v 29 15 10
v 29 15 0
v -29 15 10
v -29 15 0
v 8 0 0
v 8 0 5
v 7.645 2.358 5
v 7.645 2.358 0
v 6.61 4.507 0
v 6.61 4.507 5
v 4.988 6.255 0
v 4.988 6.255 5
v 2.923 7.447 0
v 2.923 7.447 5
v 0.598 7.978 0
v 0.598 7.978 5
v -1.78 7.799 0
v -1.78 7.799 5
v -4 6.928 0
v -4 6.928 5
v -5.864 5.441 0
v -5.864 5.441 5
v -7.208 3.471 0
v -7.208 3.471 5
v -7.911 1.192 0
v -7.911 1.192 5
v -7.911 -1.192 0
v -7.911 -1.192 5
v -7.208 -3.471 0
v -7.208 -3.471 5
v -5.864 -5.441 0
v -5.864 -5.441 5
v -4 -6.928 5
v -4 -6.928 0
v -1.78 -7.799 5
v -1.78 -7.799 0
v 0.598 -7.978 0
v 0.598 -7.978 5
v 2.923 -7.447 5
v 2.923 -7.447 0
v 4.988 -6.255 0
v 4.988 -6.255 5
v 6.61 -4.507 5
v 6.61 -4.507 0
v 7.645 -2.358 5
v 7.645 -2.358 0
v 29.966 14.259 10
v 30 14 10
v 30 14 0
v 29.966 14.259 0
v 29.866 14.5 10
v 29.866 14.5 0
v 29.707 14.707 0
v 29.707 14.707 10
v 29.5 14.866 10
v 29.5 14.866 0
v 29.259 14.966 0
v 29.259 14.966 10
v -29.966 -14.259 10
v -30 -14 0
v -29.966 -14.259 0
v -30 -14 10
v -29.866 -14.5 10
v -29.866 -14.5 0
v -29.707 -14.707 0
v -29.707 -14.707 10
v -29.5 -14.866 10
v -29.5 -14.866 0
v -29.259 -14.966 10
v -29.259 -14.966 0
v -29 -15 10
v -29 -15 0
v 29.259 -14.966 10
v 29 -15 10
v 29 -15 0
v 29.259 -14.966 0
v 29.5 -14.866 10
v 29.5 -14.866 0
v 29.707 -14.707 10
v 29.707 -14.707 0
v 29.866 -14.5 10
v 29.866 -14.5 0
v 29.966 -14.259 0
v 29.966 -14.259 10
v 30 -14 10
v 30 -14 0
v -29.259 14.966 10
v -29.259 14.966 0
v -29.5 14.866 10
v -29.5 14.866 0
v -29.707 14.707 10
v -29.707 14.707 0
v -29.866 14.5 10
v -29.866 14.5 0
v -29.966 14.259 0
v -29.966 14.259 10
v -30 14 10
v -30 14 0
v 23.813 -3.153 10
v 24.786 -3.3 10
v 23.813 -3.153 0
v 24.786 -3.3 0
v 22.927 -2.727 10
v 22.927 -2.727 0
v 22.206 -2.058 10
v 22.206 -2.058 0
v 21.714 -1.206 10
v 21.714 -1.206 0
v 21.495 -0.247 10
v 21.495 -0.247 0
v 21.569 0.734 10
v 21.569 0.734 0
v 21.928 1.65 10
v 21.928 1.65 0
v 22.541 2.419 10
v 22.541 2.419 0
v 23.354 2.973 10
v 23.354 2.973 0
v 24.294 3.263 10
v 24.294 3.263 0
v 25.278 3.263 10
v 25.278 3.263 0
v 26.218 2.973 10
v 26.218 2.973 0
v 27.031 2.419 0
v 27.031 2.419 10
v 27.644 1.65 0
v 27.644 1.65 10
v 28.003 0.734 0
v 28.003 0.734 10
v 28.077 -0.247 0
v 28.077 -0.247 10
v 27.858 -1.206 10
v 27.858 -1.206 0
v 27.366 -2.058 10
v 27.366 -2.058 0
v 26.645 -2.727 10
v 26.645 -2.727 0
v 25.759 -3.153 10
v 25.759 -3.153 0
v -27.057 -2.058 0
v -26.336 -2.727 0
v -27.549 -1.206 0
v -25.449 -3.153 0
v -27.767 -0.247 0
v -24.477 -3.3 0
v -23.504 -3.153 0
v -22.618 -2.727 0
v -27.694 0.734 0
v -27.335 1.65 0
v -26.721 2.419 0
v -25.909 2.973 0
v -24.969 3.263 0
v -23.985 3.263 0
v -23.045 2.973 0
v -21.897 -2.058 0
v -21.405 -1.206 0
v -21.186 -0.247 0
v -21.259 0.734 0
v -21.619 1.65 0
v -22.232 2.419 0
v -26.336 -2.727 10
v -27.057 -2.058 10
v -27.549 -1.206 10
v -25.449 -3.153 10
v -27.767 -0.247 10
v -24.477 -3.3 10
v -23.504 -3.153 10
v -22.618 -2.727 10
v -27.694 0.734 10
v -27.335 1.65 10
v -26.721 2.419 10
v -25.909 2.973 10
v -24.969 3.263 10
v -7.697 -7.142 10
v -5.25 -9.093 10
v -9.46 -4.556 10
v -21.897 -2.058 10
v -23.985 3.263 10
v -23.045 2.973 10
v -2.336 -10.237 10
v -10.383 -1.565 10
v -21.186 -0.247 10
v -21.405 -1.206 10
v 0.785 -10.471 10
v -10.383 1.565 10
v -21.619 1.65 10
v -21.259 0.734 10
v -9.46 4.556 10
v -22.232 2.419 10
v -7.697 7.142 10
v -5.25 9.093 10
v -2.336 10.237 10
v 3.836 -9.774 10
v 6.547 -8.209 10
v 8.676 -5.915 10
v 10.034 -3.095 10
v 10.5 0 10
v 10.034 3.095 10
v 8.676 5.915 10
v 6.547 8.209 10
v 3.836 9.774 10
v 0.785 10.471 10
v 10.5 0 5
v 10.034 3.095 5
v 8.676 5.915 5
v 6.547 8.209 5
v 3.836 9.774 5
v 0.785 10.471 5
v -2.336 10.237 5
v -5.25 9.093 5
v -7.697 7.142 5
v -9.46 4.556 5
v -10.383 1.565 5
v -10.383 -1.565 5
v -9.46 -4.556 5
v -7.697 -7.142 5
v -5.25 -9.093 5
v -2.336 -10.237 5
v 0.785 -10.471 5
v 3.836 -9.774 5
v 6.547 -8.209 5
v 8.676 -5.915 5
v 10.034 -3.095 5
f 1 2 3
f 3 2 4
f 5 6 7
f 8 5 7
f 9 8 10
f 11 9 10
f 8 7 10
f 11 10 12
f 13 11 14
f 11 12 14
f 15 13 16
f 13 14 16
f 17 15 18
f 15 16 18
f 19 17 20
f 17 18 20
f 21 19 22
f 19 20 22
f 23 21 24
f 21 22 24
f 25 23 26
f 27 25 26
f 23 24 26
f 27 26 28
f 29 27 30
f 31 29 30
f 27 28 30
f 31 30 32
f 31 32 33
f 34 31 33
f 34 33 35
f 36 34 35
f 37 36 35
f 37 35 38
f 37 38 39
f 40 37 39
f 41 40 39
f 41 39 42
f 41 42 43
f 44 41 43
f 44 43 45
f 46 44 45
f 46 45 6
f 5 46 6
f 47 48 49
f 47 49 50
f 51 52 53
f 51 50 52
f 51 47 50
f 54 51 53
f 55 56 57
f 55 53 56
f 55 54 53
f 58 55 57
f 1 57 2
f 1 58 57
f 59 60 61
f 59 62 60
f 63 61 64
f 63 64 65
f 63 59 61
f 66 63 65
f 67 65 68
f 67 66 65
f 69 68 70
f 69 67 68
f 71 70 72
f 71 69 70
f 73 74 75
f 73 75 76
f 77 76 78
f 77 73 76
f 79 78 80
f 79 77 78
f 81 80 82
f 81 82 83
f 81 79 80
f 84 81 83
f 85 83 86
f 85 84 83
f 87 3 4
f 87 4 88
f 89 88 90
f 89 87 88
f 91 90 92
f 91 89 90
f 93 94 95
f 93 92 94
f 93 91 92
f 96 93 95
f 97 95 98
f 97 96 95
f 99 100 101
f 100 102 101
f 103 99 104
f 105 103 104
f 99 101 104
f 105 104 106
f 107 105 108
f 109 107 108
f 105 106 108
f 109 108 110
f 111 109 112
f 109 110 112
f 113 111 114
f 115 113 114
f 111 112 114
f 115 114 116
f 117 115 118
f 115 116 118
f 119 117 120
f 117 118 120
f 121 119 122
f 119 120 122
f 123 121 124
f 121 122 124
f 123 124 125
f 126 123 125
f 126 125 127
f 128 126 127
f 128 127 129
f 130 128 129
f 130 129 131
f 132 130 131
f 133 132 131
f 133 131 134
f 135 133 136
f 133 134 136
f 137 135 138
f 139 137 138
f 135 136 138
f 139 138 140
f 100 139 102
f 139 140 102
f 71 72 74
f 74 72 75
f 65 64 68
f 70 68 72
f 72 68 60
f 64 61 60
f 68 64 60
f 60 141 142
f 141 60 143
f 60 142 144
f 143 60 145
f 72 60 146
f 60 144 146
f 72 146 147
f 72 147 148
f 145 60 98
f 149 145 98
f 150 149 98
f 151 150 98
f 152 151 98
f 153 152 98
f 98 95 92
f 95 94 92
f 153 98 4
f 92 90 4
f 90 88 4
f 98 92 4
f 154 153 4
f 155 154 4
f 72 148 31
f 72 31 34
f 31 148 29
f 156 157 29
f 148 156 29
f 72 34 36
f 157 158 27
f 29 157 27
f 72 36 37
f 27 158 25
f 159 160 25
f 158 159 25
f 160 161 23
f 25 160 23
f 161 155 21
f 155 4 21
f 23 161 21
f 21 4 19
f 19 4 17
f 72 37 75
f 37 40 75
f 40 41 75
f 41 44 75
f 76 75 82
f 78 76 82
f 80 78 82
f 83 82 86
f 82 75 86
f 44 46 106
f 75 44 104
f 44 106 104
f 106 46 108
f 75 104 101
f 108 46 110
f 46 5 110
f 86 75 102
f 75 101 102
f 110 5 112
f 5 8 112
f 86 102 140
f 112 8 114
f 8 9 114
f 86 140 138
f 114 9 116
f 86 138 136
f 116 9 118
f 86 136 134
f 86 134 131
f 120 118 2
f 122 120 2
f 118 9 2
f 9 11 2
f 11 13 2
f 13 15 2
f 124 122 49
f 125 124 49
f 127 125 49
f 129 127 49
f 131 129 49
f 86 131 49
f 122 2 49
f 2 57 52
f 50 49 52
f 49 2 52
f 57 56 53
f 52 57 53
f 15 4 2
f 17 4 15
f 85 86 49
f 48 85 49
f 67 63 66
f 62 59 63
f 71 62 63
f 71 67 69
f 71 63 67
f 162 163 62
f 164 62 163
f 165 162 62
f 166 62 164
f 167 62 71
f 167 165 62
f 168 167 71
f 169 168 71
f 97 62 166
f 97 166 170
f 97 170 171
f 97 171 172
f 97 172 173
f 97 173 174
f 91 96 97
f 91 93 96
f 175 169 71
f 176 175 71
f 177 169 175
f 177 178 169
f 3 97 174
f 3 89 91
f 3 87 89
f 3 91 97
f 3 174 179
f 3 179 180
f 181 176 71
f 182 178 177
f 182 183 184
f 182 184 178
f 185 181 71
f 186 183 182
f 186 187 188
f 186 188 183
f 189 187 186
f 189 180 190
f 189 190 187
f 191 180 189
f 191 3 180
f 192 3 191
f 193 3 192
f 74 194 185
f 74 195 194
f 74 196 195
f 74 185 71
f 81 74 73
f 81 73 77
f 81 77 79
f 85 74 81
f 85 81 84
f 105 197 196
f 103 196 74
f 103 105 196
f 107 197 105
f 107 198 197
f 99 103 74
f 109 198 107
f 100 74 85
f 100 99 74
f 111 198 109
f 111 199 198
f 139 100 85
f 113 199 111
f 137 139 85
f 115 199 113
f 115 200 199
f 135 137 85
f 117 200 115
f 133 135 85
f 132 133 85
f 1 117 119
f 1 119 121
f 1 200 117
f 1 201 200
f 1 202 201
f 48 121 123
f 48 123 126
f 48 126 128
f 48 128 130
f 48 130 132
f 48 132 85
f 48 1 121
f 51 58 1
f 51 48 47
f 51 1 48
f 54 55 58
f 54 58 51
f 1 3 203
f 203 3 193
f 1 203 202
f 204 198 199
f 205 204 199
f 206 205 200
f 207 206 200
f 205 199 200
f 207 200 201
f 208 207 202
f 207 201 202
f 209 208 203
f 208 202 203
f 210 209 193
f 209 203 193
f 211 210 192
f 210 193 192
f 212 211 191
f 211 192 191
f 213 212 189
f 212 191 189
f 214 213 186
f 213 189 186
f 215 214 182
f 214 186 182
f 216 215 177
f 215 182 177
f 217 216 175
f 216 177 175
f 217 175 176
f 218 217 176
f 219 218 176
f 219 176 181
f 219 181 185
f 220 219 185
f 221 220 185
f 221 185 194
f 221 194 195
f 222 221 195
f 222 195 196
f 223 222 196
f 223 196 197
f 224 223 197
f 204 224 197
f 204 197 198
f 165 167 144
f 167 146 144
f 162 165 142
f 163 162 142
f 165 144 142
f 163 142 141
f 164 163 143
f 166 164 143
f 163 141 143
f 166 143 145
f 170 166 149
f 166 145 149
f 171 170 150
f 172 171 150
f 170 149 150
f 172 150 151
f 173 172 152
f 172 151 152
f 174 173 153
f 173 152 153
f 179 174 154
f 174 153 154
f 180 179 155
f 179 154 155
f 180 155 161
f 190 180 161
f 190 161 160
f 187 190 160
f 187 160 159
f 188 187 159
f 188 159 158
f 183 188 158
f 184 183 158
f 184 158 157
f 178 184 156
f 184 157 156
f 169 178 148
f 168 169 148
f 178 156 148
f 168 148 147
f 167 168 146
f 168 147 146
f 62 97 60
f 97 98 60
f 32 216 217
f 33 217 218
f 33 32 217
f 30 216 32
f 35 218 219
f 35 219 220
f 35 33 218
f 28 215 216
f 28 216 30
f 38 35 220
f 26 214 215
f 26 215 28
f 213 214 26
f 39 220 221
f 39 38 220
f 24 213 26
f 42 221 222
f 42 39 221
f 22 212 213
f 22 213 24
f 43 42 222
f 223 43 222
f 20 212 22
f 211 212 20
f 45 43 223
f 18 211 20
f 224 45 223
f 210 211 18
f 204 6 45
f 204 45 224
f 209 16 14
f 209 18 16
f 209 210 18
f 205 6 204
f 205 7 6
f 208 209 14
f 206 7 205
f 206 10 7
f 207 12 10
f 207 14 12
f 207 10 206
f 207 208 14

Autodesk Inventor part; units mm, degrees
ref_plane "YZ Plane" through (0, 0, 0) normal (1, 0, 0) x (0, 1, 0)
ref_plane "XZ Plane" through (0, 0, 0) normal (0, 1, 0) x (-1, 0, 0)
ref_plane "XY Plane" through (0, 0, 0) normal (0, 0, 1) x (1, 0, 0)
sketch "Sketch1" plane through (0, 0, 0) normal (0, 0, 1) x (1, 0, 0)
  line L0 (-30, -15) -> (30, -15)
  line L1 (30, -15) -> (30, 15)
  line L2 (30, 15) -> (-30, 15)
  line L3 (-30, 15) -> (-30, -15)
  line L4 (-30, -15) -> (30, 15) construction
  line L5 (30, -15) -> (-30, 15) construction
  point P0 (0, 0)
  dimension "d0" = 60
  dimension "d1" = 30
extrude "Extrusion1" add sketch "Sketch1" along normal blind 10
sketch "Sketch2" plane through (0, 0, 10) normal (0, 0, 1) x (1, 0, 0)
  circle A0 centre (0, 0) radius 10.5
  dimension "d4" = 21
extrude "Extrusion2" cut sketch "Sketch2" against normal blind 5
sketch "Sketch3" plane through (0, 0, 5) normal (0, 0, 1) x (1, 0, 0)
  circle A0 centre (0, 0) radius 8
  dimension "d7" = 16
extrude "Extrusion3" cut sketch "Sketch3" against normal blind 5
sketch "Sketch4" plane through (0, 0, 10) normal (0, 0, 1) x (1, 0, 0)
  point P0 (0, 0)
  point P1 (-24.4767, 0)
  point P2 (24.786, 0)
hole "Hole1" at (-24.4767, 0, 10) at (24.786, 0, 10) direction (0, 0, -1) diameter 6.6 end through all clearance for "Hex Head Cap Screw ISO 24017" size "M6" standard "ISO"
fillet "Fillet1" radius 1 4 edges at (30, 15, 5) (30, -15, 5) (-30, 15, 5) (-30, -15, 5)
properties part number "CoinCellHolder"
